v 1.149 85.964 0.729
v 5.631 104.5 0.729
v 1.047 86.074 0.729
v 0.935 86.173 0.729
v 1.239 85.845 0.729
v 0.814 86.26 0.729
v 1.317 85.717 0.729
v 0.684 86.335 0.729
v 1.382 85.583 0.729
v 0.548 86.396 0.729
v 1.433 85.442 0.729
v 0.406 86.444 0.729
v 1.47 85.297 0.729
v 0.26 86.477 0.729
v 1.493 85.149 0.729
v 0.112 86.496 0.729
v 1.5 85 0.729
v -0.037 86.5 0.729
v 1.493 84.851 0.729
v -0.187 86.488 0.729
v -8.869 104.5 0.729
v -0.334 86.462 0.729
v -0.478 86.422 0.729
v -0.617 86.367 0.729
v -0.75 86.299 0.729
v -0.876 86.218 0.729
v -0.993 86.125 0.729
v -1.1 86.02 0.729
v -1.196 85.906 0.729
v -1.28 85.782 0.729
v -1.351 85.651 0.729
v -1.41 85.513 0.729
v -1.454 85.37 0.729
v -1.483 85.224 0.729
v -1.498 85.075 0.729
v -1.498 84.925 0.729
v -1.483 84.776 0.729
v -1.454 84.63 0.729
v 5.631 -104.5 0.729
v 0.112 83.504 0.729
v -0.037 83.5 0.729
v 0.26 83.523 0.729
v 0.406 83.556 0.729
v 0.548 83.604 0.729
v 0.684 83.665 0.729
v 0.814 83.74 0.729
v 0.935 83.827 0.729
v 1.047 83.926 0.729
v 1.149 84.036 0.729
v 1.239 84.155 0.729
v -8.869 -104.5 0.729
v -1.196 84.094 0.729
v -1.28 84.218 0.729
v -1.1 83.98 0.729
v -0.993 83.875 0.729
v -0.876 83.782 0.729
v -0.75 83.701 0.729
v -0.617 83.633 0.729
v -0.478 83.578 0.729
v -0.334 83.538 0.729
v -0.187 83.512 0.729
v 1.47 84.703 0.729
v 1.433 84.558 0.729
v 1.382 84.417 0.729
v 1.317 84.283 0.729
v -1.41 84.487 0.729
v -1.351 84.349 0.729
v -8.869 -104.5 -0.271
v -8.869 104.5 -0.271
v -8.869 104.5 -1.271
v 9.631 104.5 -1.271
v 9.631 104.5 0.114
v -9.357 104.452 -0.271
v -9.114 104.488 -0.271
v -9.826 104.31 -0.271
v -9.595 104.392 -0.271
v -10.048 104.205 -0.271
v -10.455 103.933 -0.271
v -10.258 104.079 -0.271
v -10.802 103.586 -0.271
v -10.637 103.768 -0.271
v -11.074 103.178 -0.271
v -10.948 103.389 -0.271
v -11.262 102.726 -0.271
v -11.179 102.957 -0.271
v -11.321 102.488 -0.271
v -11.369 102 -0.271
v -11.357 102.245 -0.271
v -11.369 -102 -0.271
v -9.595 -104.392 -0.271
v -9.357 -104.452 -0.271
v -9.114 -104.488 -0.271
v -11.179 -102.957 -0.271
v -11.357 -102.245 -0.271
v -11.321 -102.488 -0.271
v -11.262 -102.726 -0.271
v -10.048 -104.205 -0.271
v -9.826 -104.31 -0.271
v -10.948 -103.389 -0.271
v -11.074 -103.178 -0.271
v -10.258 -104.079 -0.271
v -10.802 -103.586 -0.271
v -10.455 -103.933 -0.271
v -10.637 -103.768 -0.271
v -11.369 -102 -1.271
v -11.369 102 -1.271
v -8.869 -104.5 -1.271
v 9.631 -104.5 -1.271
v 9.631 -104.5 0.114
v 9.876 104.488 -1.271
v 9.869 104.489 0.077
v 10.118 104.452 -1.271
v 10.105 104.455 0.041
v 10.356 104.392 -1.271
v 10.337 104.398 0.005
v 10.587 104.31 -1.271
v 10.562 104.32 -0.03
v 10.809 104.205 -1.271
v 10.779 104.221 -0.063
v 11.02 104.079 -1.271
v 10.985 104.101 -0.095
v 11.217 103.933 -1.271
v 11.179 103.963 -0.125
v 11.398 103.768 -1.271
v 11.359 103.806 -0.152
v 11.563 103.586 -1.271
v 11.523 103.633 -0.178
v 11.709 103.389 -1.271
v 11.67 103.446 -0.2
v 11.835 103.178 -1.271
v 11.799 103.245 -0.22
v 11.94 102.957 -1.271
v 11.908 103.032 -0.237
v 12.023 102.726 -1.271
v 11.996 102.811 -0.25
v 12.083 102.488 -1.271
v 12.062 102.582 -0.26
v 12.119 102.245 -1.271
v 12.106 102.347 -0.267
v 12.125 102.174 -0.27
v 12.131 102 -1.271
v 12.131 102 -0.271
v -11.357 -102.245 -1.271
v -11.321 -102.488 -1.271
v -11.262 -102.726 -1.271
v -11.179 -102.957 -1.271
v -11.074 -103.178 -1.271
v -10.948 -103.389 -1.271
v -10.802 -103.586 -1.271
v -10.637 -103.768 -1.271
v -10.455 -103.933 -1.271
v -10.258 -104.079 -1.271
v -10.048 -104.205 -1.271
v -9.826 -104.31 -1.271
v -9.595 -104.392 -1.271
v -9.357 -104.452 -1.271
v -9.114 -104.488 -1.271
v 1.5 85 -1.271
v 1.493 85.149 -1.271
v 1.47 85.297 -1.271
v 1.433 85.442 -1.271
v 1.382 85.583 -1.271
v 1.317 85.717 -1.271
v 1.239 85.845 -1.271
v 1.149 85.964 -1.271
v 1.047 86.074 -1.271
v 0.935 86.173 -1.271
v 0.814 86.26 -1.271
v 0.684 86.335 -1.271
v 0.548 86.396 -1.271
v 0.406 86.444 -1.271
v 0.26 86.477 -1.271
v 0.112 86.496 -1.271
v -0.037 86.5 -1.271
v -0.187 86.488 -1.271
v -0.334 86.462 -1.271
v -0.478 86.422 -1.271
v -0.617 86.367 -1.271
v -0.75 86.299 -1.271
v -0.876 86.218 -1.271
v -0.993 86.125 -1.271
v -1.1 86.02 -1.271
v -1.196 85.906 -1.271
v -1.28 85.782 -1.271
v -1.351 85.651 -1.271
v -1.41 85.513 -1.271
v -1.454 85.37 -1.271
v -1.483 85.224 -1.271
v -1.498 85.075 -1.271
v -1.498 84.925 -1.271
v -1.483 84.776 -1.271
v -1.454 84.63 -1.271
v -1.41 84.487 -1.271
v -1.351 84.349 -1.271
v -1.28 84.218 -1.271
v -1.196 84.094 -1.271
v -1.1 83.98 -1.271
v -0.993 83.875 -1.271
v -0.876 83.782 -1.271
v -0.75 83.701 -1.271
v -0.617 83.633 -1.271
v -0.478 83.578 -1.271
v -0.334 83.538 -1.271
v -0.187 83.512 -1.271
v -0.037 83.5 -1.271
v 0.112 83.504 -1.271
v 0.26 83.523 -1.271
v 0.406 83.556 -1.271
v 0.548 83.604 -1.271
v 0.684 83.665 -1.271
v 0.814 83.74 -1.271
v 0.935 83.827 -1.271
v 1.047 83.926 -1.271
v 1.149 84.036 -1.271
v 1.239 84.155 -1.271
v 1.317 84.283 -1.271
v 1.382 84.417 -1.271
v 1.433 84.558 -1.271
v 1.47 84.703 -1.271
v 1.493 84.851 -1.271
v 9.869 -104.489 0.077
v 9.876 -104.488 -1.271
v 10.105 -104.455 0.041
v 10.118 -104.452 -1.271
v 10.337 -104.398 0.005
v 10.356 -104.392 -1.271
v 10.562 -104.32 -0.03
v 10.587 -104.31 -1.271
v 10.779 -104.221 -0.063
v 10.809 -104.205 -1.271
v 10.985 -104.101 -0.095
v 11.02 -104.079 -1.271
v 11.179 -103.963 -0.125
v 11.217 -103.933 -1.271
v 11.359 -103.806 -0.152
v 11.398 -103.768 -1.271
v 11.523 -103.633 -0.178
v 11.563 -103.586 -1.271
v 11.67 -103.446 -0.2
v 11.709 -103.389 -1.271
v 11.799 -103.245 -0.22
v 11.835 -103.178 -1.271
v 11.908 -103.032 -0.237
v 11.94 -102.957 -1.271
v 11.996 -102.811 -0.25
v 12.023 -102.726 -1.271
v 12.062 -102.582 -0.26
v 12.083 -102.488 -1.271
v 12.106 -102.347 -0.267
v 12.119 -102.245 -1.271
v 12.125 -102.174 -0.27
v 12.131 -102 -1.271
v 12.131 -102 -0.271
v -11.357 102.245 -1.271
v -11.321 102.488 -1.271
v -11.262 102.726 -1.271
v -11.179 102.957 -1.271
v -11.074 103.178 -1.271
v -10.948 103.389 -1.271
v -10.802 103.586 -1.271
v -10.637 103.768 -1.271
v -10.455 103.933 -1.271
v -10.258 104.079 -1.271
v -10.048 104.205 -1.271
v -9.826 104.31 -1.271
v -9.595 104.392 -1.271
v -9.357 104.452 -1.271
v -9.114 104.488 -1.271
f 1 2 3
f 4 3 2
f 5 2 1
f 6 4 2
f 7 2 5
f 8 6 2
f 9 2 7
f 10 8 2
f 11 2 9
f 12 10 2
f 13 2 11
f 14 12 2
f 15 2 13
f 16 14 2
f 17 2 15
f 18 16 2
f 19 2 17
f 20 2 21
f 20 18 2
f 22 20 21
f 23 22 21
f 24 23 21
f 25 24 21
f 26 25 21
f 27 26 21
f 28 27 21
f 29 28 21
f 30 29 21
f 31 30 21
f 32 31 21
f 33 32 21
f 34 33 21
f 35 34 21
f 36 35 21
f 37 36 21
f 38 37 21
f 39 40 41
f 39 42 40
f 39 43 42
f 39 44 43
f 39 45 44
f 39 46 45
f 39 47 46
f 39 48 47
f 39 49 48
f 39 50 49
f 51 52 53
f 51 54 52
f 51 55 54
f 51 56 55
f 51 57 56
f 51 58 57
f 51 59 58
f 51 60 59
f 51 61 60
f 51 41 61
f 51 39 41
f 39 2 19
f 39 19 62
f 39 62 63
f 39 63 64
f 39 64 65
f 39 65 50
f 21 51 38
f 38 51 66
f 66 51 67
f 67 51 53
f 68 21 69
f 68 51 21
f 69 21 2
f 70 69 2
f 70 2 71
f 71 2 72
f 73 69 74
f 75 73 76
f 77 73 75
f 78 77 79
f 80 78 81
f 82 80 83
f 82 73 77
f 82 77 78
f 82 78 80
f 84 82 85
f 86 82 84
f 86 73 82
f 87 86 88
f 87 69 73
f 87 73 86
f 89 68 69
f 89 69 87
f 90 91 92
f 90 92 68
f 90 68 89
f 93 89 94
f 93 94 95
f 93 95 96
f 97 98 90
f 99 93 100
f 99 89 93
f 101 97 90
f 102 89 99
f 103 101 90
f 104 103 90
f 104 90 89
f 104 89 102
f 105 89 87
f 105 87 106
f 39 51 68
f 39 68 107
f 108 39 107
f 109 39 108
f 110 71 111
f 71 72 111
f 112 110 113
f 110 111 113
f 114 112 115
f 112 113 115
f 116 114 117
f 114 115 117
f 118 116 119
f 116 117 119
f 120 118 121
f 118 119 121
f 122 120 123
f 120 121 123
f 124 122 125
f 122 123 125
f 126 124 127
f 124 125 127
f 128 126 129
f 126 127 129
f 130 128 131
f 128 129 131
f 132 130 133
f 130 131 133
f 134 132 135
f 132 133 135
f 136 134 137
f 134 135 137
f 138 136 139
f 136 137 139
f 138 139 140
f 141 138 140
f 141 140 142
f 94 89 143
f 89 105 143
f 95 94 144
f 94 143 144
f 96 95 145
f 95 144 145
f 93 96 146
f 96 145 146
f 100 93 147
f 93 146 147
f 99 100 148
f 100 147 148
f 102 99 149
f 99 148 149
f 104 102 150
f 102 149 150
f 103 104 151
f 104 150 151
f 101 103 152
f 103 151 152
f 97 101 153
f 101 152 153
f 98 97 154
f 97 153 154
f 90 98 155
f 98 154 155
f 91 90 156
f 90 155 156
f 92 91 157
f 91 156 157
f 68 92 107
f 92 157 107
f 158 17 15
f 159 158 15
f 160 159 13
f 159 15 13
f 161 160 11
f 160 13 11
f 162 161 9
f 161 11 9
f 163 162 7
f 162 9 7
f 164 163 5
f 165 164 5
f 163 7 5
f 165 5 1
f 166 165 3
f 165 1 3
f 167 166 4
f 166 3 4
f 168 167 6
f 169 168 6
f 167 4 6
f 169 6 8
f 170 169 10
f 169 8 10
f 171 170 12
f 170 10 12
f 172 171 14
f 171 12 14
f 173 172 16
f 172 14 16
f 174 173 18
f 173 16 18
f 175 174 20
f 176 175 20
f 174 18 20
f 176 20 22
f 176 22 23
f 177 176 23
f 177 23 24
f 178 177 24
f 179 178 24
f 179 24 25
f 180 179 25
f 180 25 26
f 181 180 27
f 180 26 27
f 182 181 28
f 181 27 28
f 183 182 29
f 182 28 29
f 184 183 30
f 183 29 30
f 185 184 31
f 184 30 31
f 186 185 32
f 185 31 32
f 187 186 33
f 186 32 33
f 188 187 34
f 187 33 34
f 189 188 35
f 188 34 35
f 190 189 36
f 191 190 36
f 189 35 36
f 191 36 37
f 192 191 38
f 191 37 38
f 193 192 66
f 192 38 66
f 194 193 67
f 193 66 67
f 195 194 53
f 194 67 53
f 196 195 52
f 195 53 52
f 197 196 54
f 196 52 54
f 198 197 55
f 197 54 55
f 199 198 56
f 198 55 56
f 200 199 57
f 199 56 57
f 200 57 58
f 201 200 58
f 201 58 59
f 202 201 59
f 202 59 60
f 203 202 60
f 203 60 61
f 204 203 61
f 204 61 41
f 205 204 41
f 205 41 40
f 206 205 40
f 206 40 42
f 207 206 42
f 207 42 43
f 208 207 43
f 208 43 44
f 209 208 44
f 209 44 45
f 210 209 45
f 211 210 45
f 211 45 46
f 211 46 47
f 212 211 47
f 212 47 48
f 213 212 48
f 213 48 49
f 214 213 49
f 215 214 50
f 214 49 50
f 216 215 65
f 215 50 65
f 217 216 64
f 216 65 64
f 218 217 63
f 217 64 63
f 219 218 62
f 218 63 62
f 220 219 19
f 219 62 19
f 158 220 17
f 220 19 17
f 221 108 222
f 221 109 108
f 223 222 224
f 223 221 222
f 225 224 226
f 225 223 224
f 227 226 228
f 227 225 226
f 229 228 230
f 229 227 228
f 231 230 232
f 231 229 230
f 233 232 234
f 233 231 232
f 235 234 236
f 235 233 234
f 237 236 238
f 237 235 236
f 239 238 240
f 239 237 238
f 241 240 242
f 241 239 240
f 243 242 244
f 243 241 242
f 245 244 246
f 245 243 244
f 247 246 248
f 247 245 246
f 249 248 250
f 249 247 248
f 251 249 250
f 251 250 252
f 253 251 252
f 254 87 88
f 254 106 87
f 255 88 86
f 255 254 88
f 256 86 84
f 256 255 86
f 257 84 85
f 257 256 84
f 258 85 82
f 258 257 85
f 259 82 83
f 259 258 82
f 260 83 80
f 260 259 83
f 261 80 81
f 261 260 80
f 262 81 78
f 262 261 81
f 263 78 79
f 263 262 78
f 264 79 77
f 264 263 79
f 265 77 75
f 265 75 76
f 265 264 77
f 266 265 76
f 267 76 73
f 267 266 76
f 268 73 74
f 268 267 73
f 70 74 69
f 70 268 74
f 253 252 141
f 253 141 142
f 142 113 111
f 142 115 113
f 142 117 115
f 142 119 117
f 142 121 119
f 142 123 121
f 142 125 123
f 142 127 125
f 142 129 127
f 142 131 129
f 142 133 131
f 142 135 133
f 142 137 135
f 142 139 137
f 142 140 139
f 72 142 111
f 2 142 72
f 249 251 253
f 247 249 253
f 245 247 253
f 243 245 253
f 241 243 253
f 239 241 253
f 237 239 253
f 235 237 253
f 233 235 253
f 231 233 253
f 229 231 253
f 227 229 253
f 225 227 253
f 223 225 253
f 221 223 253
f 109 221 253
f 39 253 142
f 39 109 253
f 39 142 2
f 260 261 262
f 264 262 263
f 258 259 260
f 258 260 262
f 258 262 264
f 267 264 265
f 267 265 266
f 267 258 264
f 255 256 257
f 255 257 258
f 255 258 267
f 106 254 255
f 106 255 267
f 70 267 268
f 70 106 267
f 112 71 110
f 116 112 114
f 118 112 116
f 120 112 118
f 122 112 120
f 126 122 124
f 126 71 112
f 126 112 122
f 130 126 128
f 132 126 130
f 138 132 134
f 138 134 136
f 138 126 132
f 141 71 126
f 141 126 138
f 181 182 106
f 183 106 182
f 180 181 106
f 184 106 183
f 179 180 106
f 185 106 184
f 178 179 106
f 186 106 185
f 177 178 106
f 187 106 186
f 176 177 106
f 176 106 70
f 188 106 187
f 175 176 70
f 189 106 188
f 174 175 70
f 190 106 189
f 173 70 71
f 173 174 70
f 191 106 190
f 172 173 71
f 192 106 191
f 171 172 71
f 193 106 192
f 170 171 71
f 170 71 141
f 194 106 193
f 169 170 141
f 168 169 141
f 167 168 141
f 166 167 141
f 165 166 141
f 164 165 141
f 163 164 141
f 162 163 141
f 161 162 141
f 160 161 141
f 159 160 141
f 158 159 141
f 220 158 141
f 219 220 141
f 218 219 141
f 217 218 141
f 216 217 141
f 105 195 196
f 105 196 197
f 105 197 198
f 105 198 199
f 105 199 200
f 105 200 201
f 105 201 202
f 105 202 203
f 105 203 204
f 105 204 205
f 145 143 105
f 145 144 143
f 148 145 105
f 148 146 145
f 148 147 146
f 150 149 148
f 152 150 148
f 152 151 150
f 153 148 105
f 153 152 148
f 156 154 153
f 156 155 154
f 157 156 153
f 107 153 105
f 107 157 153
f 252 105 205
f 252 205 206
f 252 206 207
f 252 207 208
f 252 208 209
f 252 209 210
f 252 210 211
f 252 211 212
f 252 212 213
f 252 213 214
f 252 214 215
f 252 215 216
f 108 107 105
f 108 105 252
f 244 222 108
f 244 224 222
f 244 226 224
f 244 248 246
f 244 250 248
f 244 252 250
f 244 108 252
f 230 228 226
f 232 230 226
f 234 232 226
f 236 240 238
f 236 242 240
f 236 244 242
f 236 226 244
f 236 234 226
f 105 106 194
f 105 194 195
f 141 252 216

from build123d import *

# Parameters (mm, degrees)
F1_DEPTH = 104.5
F2_R     = 1.5
F3_DEPTH = 2
F4_R     = 2.5


with BuildPart() as f1:
    # F0 (on Front) → F1 (new body, symmetric)
    with BuildSketch(Plane.XZ):
        Polygon((-11.3693717867, -0.2710307762), (-11.3693717867, -1.2710307762), (12.1306282133, -1.2710307762), (12.1306282133, -0.2710307762), (5.6306282133, 0.7289692238), (-8.8693717867, 0.7289692238), (-8.8693717867, -0.2710307762), align=None)
    extrude(amount=F1_DEPTH, both=True)

    # F2 (on face) → F3 (cut)
    with BuildSketch(Plane.XY.offset(0.7289692238)):
        with Locations((0, 85)):
            Circle(F2_R)
    extrude(amount=-F3_DEPTH, mode=Mode.SUBTRACT)

    # F4
    f4_edges = [f1.edges().sort_by_distance(p)[0] for p in [
        (12.130628, 104.5, -0.771031),
        (-11.369372, 104.5, -0.771031),
        (12.130628, -104.5, -0.771031),
        (-11.369372, -104.5, -0.771031),
    ]]
    fillet(f4_edges, radius=F4_R)


solid = f1.part
